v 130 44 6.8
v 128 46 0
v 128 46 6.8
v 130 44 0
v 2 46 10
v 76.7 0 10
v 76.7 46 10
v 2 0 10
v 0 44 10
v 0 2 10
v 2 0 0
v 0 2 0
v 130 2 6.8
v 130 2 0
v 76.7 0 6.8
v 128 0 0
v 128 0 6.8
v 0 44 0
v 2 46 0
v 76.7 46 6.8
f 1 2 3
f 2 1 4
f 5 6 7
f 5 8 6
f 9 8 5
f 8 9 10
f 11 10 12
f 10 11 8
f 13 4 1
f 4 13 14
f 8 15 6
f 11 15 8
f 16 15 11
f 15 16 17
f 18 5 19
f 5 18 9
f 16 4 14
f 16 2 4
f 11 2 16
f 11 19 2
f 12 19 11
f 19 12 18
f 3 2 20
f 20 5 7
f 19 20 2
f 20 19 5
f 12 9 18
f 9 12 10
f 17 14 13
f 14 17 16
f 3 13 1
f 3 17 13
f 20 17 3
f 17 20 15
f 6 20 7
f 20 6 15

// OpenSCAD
$fn = 32;

// ----------------------------------------------------------------------
// Stepped bar: endstep, 130 x 46 x 10/6.8 mm
// ----------------------------------------------------------------------

// --- parameters (mm) ---
bar_l = 130;              // bar length, X
bar_w = 46;               // bar width, Y
plate_t = 10;             // thickness of the thick zone, Z
thin_t = 6.8;             // thickness of the thin zone
corner_c = 2;             // corner chamfer of the bar
step_cut = 3.2;           // material removed from the thin zone
step_x = 76.7;            // step position from the left end
depth_1 = 3.2;            // depth of cut 1 from the top face

profile = [[2, 0], [128, 0], [130, 2], [130, 44], [128, 46], [2, 46], [0, 44], [0, 2]];  // primary outline, 8 points, counter clockwise
void_1 = [[76.7, -1], [131, -1], [131, 47], [76.7, 47]];  // thin zone beyond the step, 4 points

// --- the one profile operation ---
difference() {
  linear_extrude(height = plate_t) polygon(points = profile);
  translate([0, 0, plate_t - depth_1])
    linear_extrude(height = depth_1 + 1) polygon(points = void_1);
}
